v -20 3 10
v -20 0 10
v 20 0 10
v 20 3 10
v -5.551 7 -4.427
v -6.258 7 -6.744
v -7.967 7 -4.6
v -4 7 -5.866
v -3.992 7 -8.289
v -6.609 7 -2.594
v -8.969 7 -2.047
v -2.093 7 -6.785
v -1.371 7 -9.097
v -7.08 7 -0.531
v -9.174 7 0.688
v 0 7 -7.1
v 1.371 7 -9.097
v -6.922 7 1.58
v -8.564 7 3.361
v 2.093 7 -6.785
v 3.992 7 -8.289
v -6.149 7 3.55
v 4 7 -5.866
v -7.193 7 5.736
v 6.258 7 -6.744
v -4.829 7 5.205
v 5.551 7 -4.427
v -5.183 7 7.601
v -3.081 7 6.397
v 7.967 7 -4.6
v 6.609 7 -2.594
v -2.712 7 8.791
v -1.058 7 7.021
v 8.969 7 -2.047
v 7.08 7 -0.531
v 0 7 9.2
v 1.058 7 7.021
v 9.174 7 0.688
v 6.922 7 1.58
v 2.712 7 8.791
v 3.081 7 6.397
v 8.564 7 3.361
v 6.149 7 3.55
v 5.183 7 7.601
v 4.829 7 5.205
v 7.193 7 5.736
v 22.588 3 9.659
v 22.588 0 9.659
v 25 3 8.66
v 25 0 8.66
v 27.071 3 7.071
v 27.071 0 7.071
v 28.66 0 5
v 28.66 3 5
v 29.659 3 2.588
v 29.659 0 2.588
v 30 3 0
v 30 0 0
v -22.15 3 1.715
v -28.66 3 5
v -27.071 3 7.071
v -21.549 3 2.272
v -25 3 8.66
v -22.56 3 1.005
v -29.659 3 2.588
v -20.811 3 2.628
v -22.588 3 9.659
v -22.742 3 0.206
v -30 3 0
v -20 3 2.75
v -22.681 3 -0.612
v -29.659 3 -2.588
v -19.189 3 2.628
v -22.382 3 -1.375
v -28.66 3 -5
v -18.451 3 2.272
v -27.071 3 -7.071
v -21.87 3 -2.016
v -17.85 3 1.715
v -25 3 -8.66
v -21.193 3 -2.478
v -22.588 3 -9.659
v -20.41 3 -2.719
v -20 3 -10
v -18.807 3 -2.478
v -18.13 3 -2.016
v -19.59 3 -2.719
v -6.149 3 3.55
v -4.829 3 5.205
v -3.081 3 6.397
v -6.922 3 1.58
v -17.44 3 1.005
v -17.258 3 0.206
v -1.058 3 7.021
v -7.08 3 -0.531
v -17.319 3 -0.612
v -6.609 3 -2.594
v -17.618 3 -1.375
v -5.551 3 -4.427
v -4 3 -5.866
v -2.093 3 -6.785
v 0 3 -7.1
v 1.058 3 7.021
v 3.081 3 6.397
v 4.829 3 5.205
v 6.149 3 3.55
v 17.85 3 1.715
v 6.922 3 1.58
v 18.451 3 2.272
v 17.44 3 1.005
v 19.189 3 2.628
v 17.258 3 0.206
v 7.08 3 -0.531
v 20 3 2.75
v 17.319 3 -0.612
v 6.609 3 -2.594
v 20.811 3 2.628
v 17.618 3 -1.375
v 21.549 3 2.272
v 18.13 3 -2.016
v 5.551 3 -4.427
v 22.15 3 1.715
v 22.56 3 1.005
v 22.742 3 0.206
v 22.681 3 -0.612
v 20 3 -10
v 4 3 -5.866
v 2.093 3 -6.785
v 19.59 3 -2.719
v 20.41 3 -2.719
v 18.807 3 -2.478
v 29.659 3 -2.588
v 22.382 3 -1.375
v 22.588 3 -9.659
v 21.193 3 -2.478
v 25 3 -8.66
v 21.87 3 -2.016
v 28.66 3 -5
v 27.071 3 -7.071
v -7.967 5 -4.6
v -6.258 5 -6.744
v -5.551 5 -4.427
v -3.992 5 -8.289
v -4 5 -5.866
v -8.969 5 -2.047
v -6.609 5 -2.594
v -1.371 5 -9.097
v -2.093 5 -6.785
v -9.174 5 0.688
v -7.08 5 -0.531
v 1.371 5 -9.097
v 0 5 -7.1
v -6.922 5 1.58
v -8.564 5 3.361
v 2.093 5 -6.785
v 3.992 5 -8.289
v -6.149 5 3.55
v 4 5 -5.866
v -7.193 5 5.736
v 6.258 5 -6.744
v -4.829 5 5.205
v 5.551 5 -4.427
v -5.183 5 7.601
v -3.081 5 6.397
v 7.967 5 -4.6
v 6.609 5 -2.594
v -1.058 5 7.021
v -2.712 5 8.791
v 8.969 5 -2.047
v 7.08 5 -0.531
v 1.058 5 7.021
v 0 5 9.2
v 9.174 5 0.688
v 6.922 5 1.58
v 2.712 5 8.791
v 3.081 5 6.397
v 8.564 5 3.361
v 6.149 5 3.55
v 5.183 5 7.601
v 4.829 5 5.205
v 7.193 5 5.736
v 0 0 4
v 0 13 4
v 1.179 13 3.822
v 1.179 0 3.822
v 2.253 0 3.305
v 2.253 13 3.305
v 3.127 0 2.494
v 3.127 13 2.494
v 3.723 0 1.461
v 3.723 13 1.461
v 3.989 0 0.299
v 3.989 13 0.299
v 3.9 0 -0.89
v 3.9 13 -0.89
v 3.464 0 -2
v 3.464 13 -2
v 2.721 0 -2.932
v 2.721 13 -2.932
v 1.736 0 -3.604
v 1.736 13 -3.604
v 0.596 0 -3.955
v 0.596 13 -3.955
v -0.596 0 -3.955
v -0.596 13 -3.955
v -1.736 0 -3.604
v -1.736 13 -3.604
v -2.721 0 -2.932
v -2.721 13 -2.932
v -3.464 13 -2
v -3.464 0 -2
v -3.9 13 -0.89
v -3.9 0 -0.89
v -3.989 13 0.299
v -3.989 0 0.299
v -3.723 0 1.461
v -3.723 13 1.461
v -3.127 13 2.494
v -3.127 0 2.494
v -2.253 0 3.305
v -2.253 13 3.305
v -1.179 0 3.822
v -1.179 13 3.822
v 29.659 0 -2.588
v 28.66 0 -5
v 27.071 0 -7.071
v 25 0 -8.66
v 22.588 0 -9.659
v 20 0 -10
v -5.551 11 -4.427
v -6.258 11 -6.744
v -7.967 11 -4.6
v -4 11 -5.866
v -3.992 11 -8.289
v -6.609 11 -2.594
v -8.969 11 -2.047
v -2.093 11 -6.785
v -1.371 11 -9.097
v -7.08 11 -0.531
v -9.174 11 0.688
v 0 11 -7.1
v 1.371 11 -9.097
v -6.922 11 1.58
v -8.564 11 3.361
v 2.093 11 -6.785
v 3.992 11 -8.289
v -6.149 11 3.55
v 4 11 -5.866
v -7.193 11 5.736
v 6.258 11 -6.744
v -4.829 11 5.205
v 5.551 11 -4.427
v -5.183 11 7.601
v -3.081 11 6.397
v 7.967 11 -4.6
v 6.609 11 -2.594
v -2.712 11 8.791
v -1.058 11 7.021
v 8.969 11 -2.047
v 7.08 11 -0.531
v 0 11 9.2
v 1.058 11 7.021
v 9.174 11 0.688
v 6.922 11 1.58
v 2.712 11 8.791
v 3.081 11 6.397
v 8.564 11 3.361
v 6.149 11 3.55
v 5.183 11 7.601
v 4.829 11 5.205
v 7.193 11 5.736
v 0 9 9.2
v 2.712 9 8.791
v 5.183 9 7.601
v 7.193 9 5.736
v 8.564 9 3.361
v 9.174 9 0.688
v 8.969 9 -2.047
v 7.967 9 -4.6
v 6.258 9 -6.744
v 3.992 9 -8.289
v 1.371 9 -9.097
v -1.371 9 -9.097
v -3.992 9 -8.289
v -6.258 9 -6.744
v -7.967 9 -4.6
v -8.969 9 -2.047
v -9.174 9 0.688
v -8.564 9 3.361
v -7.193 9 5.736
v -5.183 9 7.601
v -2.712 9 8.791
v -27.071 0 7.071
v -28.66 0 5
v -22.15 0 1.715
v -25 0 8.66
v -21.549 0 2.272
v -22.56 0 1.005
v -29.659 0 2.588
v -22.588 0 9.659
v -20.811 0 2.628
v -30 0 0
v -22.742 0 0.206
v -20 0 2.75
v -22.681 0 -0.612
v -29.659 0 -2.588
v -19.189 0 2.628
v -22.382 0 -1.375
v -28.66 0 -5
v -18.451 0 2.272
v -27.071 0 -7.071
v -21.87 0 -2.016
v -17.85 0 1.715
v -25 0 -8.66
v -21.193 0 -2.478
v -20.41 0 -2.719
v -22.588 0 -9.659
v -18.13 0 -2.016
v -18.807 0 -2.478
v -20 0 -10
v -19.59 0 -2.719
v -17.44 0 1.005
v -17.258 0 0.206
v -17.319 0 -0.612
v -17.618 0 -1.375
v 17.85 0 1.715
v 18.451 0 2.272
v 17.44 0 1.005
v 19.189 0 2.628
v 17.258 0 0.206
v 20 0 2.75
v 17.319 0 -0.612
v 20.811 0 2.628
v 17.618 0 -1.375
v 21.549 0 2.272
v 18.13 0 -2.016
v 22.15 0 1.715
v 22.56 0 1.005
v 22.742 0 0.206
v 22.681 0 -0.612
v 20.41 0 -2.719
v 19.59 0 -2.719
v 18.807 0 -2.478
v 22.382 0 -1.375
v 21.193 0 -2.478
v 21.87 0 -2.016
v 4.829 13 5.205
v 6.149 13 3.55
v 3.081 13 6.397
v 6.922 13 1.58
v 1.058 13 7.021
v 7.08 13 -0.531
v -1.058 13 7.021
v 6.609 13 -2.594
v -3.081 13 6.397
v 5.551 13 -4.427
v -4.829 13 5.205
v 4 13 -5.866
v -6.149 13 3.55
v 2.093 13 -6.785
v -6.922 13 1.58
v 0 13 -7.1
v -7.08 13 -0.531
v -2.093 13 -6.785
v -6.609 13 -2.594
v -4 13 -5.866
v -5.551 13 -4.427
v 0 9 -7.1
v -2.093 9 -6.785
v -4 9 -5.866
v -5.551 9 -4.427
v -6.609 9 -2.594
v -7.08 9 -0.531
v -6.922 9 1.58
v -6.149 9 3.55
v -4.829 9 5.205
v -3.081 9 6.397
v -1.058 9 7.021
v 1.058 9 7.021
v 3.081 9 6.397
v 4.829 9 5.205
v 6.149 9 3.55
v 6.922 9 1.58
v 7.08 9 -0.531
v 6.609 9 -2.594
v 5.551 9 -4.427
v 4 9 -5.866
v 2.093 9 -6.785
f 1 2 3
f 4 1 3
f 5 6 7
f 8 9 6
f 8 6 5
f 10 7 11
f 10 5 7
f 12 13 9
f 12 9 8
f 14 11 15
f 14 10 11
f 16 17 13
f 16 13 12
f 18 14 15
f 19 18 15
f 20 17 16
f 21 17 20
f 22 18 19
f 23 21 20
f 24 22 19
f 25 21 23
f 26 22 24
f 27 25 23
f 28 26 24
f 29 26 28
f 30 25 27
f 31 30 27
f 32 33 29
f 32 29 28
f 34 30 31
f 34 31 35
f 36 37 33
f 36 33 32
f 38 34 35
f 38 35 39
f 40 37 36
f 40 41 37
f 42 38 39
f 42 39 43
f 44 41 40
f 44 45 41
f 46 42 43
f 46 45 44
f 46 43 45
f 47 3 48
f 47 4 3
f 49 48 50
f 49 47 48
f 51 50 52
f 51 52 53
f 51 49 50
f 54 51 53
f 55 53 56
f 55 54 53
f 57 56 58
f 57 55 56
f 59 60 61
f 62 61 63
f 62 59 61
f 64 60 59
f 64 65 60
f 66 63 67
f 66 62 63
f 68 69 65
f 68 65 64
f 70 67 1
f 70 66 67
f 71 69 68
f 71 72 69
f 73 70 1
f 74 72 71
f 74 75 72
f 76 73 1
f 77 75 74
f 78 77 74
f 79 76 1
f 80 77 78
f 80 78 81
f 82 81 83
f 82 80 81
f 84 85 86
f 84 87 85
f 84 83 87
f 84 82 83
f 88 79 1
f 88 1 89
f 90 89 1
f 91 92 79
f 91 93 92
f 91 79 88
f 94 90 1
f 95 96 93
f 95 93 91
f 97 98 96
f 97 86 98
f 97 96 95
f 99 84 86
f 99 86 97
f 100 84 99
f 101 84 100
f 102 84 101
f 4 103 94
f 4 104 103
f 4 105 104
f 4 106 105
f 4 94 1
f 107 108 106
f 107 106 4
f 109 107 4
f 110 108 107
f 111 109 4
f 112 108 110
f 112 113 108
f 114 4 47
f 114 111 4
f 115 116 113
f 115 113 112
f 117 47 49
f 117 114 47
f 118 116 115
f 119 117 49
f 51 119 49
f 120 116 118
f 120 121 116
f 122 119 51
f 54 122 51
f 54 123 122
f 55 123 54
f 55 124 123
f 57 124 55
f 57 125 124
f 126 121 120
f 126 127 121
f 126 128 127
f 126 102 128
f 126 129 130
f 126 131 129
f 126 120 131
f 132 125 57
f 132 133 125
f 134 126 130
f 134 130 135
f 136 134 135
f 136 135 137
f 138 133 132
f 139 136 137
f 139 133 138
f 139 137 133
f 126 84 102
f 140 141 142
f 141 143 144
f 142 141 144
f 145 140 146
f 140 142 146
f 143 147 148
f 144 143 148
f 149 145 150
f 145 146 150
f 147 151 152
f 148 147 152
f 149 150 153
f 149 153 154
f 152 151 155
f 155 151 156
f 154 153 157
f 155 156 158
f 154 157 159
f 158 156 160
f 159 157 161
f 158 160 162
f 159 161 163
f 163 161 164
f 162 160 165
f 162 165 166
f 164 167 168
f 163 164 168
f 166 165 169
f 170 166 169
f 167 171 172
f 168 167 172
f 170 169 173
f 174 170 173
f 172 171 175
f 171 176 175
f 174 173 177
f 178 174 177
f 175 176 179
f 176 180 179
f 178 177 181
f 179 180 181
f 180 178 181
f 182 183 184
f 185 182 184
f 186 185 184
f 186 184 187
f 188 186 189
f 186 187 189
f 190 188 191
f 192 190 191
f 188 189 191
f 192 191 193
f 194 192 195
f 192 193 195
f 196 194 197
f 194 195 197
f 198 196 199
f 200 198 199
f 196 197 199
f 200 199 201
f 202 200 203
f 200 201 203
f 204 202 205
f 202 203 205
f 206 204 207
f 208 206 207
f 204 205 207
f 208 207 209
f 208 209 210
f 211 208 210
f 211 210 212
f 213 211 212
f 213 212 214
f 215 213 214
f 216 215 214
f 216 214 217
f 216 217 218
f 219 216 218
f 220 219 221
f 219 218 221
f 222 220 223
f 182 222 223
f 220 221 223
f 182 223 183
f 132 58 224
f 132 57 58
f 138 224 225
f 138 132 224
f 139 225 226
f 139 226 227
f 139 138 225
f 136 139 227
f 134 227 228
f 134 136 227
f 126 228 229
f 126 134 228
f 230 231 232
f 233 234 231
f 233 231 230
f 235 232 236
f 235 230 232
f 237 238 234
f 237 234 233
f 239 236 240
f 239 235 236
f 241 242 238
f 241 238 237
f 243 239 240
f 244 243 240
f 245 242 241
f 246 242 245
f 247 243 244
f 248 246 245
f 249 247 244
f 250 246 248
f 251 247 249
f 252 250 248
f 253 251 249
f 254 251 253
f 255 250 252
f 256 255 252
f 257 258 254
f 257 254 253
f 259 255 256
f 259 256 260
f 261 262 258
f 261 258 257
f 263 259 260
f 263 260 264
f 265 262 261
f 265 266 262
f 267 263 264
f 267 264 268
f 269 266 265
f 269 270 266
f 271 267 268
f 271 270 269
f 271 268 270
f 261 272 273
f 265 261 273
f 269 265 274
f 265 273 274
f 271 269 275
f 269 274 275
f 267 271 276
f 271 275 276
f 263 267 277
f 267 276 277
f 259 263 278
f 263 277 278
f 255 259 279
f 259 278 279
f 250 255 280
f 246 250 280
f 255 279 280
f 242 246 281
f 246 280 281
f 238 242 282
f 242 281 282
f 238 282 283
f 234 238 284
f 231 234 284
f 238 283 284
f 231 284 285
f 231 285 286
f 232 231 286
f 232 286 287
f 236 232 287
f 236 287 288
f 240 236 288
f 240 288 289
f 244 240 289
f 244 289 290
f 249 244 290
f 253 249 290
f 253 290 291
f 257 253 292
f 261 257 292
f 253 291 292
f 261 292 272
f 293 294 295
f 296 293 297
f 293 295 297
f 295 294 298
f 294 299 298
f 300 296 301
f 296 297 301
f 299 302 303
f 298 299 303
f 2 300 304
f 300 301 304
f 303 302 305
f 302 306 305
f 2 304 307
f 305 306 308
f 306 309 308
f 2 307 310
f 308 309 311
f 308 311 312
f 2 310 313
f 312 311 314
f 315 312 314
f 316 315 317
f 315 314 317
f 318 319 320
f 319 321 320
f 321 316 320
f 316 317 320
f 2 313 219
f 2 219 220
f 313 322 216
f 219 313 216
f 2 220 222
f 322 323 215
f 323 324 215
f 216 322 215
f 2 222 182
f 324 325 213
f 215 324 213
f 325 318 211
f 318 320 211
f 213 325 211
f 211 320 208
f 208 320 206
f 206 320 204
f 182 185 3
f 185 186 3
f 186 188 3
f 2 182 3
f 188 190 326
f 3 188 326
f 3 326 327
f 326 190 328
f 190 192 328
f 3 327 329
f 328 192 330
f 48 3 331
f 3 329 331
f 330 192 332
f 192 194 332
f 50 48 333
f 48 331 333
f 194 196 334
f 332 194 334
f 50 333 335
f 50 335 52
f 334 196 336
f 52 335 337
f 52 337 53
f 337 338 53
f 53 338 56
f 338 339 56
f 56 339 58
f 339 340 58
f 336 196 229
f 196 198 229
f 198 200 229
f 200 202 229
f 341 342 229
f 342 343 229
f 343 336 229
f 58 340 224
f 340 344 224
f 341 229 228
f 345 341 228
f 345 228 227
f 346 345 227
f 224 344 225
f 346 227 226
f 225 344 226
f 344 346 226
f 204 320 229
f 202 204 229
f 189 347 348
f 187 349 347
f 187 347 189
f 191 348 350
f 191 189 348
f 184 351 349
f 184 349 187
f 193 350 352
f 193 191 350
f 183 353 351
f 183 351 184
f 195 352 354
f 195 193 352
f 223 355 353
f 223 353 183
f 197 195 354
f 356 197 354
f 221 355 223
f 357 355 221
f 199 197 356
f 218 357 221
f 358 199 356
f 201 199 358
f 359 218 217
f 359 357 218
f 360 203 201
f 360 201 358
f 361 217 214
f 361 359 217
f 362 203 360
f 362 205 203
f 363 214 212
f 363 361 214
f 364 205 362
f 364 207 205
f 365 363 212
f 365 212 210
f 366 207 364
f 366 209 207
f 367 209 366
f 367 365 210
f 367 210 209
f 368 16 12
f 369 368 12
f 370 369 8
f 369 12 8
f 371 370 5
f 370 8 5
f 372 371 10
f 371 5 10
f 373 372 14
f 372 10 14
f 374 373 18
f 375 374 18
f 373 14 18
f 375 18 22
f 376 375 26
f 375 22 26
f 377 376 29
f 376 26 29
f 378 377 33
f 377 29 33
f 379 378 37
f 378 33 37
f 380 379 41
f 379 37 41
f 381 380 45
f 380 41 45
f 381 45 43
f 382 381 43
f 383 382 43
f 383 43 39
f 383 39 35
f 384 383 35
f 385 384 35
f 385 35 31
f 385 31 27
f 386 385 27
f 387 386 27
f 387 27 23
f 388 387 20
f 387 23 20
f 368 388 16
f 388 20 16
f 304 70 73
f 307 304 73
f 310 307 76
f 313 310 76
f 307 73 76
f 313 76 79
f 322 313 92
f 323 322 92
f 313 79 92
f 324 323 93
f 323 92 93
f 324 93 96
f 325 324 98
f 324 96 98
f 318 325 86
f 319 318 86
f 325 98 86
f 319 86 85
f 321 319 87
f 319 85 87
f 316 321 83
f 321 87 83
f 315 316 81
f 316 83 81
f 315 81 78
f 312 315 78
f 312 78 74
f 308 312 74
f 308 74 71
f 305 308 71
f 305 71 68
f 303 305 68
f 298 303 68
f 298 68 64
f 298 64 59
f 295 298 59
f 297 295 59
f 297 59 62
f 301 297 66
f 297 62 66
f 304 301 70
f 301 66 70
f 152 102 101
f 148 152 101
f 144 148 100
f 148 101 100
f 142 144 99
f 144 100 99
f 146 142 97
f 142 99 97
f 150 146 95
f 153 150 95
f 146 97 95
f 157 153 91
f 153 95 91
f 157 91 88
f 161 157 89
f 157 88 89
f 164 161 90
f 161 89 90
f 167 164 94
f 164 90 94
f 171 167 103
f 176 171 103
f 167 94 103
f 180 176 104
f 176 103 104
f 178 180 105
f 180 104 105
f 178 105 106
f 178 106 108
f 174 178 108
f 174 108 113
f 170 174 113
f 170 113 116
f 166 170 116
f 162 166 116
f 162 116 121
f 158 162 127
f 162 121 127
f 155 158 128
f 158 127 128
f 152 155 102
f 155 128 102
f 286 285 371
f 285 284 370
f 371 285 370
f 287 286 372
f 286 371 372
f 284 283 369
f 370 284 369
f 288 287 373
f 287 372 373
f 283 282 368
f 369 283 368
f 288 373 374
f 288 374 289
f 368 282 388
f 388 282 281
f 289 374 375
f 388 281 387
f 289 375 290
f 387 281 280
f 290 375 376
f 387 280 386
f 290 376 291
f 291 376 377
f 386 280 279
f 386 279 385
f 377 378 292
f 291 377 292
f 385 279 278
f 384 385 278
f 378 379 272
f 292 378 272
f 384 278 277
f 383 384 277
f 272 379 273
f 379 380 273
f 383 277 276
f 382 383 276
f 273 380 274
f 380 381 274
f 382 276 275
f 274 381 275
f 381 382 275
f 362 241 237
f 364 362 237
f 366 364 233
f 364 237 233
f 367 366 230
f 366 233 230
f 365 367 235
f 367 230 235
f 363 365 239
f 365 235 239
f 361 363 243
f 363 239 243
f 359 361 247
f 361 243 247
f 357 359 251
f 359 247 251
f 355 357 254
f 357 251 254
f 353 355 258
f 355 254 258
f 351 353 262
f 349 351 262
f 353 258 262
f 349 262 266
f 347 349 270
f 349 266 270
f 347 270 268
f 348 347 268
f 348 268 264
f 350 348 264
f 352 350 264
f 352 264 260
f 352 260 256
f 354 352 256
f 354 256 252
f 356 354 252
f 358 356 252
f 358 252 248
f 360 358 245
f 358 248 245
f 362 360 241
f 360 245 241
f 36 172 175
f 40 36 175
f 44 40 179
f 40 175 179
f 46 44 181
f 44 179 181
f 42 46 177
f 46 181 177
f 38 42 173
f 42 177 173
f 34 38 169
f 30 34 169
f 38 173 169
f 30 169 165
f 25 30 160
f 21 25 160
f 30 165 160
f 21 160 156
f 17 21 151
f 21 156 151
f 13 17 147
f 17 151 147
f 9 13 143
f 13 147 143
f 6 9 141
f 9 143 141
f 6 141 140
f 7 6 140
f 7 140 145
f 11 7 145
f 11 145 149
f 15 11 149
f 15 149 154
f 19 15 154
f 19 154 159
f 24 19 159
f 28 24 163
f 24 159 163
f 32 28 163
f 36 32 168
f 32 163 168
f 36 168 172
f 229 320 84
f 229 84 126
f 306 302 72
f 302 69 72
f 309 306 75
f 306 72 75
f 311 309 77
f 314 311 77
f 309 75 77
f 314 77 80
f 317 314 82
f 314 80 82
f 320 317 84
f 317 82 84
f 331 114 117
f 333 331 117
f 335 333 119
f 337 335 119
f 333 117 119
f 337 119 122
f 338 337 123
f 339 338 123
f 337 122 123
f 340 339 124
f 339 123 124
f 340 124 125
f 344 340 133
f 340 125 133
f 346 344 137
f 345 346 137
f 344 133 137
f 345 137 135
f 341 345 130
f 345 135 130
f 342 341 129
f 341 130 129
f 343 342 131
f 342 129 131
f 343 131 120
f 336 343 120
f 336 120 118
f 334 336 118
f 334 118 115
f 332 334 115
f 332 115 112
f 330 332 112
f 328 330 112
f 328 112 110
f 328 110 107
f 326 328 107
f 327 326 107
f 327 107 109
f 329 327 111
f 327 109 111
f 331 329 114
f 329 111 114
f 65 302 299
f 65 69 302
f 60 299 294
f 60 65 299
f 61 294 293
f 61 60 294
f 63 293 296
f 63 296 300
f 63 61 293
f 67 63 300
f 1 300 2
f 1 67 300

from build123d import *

# Parameters (mm, degrees)
SKETCH1_W            = 60
SKETCH1_H            = 20
BOSS_EXTRUDE1_DEPTH  = 3
FILLET1_R            = 10
SKETCH36_R           = 7.1
BOSS_EXTRUDE15_DEPTH = 2
SKETCH37_R           = 9.2
BOSS_EXTRUDE16_DEPTH = 2
SKETCH39_R           = 7.1
BOSS_EXTRUDE18_DEPTH = 2
SKETCH40_R           = 9.2
BOSS_EXTRUDE19_DEPTH = 2
SKETCH41_R           = 7.1
BOSS_EXTRUDE20_DEPTH = 2
SKETCH42_R           = 4
CUT_EXTRUDE5_DEPTH   = 13
SKETCH43_R           = 2.75
CUT_EXTRUDE6_DEPTH   = 3


with BuildPart() as part:
    # Sketch1 → Boss-Extrude1 (new body)
    with BuildSketch(Plane(origin=(0, 0, 0), x_dir=(1, 0, 0), z_dir=(0, 1, 0))):
        Rectangle(SKETCH1_W, SKETCH1_H)
    extrude(amount=BOSS_EXTRUDE1_DEPTH)

    # Fillet1
    fillet1_edges = [part.edges().sort_by_distance(p)[0] for p in [
        (30, 1.5, -10),
        (30, 1.5, 10),
        (-30, 1.5, 10),
        (-30, 1.5, -10),
    ]]
    fillet(fillet1_edges, radius=FILLET1_R - 0.0001)  # a hair under: the kernel refuses the full size

    # Sketch36 → Boss-Extrude15 (add)
    with BuildSketch(Plane(origin=(0, 3, 0), x_dir=(1, 0, 0), z_dir=(0, 1, 0))):
        with Locations(Location((0, 0, 0), (0, 0, 90))):
            Circle(SKETCH36_R)
    extrude(amount=BOSS_EXTRUDE15_DEPTH)

    # Sketch37 → Boss-Extrude16 (add)
    with BuildSketch(Plane(origin=(0, 5, 0), x_dir=(1, 0, 0), z_dir=(0, 1, 0))):
        with Locations(Location((0, 0, 0), (0, 0, 270))):
            Circle(SKETCH37_R)
    extrude(amount=BOSS_EXTRUDE16_DEPTH)

    # Sketch39 → Boss-Extrude18 (add)
    with BuildSketch(Plane(origin=(0, 7, 0), x_dir=(1, 0, 0), z_dir=(0, 1, 0))):
        with Locations(Location((0, 0, 0), (0, 0, 90))):
            Circle(SKETCH39_R)
    extrude(amount=BOSS_EXTRUDE18_DEPTH)

    # Sketch40 → Boss-Extrude19 (add)
    with BuildSketch(Plane(origin=(0, 9, 0), x_dir=(1, 0, 0), z_dir=(0, 1, 0))):
        with Locations(Location((0, 0, 0), (0, 0, 270))):
            Circle(SKETCH40_R)
    extrude(amount=BOSS_EXTRUDE19_DEPTH)

    # Sketch41 → Boss-Extrude20 (add)
    with BuildSketch(Plane(origin=(0, 11, 0), x_dir=(1, 0, 0), z_dir=(0, 1, 0))):
        with Locations(Location((0, 0, 0), (0, 0, 90))):
            Circle(SKETCH41_R)
    extrude(amount=BOSS_EXTRUDE20_DEPTH)

    # Sketch42 → Cut-Extrude5 (cut)
    with BuildSketch(Plane(origin=(0, 13, 0), x_dir=(1, 0, 0), z_dir=(0, 1, 0))):
        with Locations(Location((0, 0, 0), (0, 0, 270))):
            Circle(SKETCH42_R)
    extrude(amount=-CUT_EXTRUDE5_DEPTH, mode=Mode.SUBTRACT)

    # Sketch43 → Cut-Extrude6 (cut)
    with BuildSketch(Plane(origin=(0, 3, 0), x_dir=(1, 0, 0), z_dir=(0, 1, 0))):
        with Locations(Location((-20, 0, 0), (0, 0, 270))):
            Circle(SKETCH43_R)
        with Locations(Location((20, 0, 0), (0, 0, 270))):
            Circle(SKETCH43_R)
    extrude(amount=-CUT_EXTRUDE6_DEPTH, mode=Mode.SUBTRACT)


solid = part.part
